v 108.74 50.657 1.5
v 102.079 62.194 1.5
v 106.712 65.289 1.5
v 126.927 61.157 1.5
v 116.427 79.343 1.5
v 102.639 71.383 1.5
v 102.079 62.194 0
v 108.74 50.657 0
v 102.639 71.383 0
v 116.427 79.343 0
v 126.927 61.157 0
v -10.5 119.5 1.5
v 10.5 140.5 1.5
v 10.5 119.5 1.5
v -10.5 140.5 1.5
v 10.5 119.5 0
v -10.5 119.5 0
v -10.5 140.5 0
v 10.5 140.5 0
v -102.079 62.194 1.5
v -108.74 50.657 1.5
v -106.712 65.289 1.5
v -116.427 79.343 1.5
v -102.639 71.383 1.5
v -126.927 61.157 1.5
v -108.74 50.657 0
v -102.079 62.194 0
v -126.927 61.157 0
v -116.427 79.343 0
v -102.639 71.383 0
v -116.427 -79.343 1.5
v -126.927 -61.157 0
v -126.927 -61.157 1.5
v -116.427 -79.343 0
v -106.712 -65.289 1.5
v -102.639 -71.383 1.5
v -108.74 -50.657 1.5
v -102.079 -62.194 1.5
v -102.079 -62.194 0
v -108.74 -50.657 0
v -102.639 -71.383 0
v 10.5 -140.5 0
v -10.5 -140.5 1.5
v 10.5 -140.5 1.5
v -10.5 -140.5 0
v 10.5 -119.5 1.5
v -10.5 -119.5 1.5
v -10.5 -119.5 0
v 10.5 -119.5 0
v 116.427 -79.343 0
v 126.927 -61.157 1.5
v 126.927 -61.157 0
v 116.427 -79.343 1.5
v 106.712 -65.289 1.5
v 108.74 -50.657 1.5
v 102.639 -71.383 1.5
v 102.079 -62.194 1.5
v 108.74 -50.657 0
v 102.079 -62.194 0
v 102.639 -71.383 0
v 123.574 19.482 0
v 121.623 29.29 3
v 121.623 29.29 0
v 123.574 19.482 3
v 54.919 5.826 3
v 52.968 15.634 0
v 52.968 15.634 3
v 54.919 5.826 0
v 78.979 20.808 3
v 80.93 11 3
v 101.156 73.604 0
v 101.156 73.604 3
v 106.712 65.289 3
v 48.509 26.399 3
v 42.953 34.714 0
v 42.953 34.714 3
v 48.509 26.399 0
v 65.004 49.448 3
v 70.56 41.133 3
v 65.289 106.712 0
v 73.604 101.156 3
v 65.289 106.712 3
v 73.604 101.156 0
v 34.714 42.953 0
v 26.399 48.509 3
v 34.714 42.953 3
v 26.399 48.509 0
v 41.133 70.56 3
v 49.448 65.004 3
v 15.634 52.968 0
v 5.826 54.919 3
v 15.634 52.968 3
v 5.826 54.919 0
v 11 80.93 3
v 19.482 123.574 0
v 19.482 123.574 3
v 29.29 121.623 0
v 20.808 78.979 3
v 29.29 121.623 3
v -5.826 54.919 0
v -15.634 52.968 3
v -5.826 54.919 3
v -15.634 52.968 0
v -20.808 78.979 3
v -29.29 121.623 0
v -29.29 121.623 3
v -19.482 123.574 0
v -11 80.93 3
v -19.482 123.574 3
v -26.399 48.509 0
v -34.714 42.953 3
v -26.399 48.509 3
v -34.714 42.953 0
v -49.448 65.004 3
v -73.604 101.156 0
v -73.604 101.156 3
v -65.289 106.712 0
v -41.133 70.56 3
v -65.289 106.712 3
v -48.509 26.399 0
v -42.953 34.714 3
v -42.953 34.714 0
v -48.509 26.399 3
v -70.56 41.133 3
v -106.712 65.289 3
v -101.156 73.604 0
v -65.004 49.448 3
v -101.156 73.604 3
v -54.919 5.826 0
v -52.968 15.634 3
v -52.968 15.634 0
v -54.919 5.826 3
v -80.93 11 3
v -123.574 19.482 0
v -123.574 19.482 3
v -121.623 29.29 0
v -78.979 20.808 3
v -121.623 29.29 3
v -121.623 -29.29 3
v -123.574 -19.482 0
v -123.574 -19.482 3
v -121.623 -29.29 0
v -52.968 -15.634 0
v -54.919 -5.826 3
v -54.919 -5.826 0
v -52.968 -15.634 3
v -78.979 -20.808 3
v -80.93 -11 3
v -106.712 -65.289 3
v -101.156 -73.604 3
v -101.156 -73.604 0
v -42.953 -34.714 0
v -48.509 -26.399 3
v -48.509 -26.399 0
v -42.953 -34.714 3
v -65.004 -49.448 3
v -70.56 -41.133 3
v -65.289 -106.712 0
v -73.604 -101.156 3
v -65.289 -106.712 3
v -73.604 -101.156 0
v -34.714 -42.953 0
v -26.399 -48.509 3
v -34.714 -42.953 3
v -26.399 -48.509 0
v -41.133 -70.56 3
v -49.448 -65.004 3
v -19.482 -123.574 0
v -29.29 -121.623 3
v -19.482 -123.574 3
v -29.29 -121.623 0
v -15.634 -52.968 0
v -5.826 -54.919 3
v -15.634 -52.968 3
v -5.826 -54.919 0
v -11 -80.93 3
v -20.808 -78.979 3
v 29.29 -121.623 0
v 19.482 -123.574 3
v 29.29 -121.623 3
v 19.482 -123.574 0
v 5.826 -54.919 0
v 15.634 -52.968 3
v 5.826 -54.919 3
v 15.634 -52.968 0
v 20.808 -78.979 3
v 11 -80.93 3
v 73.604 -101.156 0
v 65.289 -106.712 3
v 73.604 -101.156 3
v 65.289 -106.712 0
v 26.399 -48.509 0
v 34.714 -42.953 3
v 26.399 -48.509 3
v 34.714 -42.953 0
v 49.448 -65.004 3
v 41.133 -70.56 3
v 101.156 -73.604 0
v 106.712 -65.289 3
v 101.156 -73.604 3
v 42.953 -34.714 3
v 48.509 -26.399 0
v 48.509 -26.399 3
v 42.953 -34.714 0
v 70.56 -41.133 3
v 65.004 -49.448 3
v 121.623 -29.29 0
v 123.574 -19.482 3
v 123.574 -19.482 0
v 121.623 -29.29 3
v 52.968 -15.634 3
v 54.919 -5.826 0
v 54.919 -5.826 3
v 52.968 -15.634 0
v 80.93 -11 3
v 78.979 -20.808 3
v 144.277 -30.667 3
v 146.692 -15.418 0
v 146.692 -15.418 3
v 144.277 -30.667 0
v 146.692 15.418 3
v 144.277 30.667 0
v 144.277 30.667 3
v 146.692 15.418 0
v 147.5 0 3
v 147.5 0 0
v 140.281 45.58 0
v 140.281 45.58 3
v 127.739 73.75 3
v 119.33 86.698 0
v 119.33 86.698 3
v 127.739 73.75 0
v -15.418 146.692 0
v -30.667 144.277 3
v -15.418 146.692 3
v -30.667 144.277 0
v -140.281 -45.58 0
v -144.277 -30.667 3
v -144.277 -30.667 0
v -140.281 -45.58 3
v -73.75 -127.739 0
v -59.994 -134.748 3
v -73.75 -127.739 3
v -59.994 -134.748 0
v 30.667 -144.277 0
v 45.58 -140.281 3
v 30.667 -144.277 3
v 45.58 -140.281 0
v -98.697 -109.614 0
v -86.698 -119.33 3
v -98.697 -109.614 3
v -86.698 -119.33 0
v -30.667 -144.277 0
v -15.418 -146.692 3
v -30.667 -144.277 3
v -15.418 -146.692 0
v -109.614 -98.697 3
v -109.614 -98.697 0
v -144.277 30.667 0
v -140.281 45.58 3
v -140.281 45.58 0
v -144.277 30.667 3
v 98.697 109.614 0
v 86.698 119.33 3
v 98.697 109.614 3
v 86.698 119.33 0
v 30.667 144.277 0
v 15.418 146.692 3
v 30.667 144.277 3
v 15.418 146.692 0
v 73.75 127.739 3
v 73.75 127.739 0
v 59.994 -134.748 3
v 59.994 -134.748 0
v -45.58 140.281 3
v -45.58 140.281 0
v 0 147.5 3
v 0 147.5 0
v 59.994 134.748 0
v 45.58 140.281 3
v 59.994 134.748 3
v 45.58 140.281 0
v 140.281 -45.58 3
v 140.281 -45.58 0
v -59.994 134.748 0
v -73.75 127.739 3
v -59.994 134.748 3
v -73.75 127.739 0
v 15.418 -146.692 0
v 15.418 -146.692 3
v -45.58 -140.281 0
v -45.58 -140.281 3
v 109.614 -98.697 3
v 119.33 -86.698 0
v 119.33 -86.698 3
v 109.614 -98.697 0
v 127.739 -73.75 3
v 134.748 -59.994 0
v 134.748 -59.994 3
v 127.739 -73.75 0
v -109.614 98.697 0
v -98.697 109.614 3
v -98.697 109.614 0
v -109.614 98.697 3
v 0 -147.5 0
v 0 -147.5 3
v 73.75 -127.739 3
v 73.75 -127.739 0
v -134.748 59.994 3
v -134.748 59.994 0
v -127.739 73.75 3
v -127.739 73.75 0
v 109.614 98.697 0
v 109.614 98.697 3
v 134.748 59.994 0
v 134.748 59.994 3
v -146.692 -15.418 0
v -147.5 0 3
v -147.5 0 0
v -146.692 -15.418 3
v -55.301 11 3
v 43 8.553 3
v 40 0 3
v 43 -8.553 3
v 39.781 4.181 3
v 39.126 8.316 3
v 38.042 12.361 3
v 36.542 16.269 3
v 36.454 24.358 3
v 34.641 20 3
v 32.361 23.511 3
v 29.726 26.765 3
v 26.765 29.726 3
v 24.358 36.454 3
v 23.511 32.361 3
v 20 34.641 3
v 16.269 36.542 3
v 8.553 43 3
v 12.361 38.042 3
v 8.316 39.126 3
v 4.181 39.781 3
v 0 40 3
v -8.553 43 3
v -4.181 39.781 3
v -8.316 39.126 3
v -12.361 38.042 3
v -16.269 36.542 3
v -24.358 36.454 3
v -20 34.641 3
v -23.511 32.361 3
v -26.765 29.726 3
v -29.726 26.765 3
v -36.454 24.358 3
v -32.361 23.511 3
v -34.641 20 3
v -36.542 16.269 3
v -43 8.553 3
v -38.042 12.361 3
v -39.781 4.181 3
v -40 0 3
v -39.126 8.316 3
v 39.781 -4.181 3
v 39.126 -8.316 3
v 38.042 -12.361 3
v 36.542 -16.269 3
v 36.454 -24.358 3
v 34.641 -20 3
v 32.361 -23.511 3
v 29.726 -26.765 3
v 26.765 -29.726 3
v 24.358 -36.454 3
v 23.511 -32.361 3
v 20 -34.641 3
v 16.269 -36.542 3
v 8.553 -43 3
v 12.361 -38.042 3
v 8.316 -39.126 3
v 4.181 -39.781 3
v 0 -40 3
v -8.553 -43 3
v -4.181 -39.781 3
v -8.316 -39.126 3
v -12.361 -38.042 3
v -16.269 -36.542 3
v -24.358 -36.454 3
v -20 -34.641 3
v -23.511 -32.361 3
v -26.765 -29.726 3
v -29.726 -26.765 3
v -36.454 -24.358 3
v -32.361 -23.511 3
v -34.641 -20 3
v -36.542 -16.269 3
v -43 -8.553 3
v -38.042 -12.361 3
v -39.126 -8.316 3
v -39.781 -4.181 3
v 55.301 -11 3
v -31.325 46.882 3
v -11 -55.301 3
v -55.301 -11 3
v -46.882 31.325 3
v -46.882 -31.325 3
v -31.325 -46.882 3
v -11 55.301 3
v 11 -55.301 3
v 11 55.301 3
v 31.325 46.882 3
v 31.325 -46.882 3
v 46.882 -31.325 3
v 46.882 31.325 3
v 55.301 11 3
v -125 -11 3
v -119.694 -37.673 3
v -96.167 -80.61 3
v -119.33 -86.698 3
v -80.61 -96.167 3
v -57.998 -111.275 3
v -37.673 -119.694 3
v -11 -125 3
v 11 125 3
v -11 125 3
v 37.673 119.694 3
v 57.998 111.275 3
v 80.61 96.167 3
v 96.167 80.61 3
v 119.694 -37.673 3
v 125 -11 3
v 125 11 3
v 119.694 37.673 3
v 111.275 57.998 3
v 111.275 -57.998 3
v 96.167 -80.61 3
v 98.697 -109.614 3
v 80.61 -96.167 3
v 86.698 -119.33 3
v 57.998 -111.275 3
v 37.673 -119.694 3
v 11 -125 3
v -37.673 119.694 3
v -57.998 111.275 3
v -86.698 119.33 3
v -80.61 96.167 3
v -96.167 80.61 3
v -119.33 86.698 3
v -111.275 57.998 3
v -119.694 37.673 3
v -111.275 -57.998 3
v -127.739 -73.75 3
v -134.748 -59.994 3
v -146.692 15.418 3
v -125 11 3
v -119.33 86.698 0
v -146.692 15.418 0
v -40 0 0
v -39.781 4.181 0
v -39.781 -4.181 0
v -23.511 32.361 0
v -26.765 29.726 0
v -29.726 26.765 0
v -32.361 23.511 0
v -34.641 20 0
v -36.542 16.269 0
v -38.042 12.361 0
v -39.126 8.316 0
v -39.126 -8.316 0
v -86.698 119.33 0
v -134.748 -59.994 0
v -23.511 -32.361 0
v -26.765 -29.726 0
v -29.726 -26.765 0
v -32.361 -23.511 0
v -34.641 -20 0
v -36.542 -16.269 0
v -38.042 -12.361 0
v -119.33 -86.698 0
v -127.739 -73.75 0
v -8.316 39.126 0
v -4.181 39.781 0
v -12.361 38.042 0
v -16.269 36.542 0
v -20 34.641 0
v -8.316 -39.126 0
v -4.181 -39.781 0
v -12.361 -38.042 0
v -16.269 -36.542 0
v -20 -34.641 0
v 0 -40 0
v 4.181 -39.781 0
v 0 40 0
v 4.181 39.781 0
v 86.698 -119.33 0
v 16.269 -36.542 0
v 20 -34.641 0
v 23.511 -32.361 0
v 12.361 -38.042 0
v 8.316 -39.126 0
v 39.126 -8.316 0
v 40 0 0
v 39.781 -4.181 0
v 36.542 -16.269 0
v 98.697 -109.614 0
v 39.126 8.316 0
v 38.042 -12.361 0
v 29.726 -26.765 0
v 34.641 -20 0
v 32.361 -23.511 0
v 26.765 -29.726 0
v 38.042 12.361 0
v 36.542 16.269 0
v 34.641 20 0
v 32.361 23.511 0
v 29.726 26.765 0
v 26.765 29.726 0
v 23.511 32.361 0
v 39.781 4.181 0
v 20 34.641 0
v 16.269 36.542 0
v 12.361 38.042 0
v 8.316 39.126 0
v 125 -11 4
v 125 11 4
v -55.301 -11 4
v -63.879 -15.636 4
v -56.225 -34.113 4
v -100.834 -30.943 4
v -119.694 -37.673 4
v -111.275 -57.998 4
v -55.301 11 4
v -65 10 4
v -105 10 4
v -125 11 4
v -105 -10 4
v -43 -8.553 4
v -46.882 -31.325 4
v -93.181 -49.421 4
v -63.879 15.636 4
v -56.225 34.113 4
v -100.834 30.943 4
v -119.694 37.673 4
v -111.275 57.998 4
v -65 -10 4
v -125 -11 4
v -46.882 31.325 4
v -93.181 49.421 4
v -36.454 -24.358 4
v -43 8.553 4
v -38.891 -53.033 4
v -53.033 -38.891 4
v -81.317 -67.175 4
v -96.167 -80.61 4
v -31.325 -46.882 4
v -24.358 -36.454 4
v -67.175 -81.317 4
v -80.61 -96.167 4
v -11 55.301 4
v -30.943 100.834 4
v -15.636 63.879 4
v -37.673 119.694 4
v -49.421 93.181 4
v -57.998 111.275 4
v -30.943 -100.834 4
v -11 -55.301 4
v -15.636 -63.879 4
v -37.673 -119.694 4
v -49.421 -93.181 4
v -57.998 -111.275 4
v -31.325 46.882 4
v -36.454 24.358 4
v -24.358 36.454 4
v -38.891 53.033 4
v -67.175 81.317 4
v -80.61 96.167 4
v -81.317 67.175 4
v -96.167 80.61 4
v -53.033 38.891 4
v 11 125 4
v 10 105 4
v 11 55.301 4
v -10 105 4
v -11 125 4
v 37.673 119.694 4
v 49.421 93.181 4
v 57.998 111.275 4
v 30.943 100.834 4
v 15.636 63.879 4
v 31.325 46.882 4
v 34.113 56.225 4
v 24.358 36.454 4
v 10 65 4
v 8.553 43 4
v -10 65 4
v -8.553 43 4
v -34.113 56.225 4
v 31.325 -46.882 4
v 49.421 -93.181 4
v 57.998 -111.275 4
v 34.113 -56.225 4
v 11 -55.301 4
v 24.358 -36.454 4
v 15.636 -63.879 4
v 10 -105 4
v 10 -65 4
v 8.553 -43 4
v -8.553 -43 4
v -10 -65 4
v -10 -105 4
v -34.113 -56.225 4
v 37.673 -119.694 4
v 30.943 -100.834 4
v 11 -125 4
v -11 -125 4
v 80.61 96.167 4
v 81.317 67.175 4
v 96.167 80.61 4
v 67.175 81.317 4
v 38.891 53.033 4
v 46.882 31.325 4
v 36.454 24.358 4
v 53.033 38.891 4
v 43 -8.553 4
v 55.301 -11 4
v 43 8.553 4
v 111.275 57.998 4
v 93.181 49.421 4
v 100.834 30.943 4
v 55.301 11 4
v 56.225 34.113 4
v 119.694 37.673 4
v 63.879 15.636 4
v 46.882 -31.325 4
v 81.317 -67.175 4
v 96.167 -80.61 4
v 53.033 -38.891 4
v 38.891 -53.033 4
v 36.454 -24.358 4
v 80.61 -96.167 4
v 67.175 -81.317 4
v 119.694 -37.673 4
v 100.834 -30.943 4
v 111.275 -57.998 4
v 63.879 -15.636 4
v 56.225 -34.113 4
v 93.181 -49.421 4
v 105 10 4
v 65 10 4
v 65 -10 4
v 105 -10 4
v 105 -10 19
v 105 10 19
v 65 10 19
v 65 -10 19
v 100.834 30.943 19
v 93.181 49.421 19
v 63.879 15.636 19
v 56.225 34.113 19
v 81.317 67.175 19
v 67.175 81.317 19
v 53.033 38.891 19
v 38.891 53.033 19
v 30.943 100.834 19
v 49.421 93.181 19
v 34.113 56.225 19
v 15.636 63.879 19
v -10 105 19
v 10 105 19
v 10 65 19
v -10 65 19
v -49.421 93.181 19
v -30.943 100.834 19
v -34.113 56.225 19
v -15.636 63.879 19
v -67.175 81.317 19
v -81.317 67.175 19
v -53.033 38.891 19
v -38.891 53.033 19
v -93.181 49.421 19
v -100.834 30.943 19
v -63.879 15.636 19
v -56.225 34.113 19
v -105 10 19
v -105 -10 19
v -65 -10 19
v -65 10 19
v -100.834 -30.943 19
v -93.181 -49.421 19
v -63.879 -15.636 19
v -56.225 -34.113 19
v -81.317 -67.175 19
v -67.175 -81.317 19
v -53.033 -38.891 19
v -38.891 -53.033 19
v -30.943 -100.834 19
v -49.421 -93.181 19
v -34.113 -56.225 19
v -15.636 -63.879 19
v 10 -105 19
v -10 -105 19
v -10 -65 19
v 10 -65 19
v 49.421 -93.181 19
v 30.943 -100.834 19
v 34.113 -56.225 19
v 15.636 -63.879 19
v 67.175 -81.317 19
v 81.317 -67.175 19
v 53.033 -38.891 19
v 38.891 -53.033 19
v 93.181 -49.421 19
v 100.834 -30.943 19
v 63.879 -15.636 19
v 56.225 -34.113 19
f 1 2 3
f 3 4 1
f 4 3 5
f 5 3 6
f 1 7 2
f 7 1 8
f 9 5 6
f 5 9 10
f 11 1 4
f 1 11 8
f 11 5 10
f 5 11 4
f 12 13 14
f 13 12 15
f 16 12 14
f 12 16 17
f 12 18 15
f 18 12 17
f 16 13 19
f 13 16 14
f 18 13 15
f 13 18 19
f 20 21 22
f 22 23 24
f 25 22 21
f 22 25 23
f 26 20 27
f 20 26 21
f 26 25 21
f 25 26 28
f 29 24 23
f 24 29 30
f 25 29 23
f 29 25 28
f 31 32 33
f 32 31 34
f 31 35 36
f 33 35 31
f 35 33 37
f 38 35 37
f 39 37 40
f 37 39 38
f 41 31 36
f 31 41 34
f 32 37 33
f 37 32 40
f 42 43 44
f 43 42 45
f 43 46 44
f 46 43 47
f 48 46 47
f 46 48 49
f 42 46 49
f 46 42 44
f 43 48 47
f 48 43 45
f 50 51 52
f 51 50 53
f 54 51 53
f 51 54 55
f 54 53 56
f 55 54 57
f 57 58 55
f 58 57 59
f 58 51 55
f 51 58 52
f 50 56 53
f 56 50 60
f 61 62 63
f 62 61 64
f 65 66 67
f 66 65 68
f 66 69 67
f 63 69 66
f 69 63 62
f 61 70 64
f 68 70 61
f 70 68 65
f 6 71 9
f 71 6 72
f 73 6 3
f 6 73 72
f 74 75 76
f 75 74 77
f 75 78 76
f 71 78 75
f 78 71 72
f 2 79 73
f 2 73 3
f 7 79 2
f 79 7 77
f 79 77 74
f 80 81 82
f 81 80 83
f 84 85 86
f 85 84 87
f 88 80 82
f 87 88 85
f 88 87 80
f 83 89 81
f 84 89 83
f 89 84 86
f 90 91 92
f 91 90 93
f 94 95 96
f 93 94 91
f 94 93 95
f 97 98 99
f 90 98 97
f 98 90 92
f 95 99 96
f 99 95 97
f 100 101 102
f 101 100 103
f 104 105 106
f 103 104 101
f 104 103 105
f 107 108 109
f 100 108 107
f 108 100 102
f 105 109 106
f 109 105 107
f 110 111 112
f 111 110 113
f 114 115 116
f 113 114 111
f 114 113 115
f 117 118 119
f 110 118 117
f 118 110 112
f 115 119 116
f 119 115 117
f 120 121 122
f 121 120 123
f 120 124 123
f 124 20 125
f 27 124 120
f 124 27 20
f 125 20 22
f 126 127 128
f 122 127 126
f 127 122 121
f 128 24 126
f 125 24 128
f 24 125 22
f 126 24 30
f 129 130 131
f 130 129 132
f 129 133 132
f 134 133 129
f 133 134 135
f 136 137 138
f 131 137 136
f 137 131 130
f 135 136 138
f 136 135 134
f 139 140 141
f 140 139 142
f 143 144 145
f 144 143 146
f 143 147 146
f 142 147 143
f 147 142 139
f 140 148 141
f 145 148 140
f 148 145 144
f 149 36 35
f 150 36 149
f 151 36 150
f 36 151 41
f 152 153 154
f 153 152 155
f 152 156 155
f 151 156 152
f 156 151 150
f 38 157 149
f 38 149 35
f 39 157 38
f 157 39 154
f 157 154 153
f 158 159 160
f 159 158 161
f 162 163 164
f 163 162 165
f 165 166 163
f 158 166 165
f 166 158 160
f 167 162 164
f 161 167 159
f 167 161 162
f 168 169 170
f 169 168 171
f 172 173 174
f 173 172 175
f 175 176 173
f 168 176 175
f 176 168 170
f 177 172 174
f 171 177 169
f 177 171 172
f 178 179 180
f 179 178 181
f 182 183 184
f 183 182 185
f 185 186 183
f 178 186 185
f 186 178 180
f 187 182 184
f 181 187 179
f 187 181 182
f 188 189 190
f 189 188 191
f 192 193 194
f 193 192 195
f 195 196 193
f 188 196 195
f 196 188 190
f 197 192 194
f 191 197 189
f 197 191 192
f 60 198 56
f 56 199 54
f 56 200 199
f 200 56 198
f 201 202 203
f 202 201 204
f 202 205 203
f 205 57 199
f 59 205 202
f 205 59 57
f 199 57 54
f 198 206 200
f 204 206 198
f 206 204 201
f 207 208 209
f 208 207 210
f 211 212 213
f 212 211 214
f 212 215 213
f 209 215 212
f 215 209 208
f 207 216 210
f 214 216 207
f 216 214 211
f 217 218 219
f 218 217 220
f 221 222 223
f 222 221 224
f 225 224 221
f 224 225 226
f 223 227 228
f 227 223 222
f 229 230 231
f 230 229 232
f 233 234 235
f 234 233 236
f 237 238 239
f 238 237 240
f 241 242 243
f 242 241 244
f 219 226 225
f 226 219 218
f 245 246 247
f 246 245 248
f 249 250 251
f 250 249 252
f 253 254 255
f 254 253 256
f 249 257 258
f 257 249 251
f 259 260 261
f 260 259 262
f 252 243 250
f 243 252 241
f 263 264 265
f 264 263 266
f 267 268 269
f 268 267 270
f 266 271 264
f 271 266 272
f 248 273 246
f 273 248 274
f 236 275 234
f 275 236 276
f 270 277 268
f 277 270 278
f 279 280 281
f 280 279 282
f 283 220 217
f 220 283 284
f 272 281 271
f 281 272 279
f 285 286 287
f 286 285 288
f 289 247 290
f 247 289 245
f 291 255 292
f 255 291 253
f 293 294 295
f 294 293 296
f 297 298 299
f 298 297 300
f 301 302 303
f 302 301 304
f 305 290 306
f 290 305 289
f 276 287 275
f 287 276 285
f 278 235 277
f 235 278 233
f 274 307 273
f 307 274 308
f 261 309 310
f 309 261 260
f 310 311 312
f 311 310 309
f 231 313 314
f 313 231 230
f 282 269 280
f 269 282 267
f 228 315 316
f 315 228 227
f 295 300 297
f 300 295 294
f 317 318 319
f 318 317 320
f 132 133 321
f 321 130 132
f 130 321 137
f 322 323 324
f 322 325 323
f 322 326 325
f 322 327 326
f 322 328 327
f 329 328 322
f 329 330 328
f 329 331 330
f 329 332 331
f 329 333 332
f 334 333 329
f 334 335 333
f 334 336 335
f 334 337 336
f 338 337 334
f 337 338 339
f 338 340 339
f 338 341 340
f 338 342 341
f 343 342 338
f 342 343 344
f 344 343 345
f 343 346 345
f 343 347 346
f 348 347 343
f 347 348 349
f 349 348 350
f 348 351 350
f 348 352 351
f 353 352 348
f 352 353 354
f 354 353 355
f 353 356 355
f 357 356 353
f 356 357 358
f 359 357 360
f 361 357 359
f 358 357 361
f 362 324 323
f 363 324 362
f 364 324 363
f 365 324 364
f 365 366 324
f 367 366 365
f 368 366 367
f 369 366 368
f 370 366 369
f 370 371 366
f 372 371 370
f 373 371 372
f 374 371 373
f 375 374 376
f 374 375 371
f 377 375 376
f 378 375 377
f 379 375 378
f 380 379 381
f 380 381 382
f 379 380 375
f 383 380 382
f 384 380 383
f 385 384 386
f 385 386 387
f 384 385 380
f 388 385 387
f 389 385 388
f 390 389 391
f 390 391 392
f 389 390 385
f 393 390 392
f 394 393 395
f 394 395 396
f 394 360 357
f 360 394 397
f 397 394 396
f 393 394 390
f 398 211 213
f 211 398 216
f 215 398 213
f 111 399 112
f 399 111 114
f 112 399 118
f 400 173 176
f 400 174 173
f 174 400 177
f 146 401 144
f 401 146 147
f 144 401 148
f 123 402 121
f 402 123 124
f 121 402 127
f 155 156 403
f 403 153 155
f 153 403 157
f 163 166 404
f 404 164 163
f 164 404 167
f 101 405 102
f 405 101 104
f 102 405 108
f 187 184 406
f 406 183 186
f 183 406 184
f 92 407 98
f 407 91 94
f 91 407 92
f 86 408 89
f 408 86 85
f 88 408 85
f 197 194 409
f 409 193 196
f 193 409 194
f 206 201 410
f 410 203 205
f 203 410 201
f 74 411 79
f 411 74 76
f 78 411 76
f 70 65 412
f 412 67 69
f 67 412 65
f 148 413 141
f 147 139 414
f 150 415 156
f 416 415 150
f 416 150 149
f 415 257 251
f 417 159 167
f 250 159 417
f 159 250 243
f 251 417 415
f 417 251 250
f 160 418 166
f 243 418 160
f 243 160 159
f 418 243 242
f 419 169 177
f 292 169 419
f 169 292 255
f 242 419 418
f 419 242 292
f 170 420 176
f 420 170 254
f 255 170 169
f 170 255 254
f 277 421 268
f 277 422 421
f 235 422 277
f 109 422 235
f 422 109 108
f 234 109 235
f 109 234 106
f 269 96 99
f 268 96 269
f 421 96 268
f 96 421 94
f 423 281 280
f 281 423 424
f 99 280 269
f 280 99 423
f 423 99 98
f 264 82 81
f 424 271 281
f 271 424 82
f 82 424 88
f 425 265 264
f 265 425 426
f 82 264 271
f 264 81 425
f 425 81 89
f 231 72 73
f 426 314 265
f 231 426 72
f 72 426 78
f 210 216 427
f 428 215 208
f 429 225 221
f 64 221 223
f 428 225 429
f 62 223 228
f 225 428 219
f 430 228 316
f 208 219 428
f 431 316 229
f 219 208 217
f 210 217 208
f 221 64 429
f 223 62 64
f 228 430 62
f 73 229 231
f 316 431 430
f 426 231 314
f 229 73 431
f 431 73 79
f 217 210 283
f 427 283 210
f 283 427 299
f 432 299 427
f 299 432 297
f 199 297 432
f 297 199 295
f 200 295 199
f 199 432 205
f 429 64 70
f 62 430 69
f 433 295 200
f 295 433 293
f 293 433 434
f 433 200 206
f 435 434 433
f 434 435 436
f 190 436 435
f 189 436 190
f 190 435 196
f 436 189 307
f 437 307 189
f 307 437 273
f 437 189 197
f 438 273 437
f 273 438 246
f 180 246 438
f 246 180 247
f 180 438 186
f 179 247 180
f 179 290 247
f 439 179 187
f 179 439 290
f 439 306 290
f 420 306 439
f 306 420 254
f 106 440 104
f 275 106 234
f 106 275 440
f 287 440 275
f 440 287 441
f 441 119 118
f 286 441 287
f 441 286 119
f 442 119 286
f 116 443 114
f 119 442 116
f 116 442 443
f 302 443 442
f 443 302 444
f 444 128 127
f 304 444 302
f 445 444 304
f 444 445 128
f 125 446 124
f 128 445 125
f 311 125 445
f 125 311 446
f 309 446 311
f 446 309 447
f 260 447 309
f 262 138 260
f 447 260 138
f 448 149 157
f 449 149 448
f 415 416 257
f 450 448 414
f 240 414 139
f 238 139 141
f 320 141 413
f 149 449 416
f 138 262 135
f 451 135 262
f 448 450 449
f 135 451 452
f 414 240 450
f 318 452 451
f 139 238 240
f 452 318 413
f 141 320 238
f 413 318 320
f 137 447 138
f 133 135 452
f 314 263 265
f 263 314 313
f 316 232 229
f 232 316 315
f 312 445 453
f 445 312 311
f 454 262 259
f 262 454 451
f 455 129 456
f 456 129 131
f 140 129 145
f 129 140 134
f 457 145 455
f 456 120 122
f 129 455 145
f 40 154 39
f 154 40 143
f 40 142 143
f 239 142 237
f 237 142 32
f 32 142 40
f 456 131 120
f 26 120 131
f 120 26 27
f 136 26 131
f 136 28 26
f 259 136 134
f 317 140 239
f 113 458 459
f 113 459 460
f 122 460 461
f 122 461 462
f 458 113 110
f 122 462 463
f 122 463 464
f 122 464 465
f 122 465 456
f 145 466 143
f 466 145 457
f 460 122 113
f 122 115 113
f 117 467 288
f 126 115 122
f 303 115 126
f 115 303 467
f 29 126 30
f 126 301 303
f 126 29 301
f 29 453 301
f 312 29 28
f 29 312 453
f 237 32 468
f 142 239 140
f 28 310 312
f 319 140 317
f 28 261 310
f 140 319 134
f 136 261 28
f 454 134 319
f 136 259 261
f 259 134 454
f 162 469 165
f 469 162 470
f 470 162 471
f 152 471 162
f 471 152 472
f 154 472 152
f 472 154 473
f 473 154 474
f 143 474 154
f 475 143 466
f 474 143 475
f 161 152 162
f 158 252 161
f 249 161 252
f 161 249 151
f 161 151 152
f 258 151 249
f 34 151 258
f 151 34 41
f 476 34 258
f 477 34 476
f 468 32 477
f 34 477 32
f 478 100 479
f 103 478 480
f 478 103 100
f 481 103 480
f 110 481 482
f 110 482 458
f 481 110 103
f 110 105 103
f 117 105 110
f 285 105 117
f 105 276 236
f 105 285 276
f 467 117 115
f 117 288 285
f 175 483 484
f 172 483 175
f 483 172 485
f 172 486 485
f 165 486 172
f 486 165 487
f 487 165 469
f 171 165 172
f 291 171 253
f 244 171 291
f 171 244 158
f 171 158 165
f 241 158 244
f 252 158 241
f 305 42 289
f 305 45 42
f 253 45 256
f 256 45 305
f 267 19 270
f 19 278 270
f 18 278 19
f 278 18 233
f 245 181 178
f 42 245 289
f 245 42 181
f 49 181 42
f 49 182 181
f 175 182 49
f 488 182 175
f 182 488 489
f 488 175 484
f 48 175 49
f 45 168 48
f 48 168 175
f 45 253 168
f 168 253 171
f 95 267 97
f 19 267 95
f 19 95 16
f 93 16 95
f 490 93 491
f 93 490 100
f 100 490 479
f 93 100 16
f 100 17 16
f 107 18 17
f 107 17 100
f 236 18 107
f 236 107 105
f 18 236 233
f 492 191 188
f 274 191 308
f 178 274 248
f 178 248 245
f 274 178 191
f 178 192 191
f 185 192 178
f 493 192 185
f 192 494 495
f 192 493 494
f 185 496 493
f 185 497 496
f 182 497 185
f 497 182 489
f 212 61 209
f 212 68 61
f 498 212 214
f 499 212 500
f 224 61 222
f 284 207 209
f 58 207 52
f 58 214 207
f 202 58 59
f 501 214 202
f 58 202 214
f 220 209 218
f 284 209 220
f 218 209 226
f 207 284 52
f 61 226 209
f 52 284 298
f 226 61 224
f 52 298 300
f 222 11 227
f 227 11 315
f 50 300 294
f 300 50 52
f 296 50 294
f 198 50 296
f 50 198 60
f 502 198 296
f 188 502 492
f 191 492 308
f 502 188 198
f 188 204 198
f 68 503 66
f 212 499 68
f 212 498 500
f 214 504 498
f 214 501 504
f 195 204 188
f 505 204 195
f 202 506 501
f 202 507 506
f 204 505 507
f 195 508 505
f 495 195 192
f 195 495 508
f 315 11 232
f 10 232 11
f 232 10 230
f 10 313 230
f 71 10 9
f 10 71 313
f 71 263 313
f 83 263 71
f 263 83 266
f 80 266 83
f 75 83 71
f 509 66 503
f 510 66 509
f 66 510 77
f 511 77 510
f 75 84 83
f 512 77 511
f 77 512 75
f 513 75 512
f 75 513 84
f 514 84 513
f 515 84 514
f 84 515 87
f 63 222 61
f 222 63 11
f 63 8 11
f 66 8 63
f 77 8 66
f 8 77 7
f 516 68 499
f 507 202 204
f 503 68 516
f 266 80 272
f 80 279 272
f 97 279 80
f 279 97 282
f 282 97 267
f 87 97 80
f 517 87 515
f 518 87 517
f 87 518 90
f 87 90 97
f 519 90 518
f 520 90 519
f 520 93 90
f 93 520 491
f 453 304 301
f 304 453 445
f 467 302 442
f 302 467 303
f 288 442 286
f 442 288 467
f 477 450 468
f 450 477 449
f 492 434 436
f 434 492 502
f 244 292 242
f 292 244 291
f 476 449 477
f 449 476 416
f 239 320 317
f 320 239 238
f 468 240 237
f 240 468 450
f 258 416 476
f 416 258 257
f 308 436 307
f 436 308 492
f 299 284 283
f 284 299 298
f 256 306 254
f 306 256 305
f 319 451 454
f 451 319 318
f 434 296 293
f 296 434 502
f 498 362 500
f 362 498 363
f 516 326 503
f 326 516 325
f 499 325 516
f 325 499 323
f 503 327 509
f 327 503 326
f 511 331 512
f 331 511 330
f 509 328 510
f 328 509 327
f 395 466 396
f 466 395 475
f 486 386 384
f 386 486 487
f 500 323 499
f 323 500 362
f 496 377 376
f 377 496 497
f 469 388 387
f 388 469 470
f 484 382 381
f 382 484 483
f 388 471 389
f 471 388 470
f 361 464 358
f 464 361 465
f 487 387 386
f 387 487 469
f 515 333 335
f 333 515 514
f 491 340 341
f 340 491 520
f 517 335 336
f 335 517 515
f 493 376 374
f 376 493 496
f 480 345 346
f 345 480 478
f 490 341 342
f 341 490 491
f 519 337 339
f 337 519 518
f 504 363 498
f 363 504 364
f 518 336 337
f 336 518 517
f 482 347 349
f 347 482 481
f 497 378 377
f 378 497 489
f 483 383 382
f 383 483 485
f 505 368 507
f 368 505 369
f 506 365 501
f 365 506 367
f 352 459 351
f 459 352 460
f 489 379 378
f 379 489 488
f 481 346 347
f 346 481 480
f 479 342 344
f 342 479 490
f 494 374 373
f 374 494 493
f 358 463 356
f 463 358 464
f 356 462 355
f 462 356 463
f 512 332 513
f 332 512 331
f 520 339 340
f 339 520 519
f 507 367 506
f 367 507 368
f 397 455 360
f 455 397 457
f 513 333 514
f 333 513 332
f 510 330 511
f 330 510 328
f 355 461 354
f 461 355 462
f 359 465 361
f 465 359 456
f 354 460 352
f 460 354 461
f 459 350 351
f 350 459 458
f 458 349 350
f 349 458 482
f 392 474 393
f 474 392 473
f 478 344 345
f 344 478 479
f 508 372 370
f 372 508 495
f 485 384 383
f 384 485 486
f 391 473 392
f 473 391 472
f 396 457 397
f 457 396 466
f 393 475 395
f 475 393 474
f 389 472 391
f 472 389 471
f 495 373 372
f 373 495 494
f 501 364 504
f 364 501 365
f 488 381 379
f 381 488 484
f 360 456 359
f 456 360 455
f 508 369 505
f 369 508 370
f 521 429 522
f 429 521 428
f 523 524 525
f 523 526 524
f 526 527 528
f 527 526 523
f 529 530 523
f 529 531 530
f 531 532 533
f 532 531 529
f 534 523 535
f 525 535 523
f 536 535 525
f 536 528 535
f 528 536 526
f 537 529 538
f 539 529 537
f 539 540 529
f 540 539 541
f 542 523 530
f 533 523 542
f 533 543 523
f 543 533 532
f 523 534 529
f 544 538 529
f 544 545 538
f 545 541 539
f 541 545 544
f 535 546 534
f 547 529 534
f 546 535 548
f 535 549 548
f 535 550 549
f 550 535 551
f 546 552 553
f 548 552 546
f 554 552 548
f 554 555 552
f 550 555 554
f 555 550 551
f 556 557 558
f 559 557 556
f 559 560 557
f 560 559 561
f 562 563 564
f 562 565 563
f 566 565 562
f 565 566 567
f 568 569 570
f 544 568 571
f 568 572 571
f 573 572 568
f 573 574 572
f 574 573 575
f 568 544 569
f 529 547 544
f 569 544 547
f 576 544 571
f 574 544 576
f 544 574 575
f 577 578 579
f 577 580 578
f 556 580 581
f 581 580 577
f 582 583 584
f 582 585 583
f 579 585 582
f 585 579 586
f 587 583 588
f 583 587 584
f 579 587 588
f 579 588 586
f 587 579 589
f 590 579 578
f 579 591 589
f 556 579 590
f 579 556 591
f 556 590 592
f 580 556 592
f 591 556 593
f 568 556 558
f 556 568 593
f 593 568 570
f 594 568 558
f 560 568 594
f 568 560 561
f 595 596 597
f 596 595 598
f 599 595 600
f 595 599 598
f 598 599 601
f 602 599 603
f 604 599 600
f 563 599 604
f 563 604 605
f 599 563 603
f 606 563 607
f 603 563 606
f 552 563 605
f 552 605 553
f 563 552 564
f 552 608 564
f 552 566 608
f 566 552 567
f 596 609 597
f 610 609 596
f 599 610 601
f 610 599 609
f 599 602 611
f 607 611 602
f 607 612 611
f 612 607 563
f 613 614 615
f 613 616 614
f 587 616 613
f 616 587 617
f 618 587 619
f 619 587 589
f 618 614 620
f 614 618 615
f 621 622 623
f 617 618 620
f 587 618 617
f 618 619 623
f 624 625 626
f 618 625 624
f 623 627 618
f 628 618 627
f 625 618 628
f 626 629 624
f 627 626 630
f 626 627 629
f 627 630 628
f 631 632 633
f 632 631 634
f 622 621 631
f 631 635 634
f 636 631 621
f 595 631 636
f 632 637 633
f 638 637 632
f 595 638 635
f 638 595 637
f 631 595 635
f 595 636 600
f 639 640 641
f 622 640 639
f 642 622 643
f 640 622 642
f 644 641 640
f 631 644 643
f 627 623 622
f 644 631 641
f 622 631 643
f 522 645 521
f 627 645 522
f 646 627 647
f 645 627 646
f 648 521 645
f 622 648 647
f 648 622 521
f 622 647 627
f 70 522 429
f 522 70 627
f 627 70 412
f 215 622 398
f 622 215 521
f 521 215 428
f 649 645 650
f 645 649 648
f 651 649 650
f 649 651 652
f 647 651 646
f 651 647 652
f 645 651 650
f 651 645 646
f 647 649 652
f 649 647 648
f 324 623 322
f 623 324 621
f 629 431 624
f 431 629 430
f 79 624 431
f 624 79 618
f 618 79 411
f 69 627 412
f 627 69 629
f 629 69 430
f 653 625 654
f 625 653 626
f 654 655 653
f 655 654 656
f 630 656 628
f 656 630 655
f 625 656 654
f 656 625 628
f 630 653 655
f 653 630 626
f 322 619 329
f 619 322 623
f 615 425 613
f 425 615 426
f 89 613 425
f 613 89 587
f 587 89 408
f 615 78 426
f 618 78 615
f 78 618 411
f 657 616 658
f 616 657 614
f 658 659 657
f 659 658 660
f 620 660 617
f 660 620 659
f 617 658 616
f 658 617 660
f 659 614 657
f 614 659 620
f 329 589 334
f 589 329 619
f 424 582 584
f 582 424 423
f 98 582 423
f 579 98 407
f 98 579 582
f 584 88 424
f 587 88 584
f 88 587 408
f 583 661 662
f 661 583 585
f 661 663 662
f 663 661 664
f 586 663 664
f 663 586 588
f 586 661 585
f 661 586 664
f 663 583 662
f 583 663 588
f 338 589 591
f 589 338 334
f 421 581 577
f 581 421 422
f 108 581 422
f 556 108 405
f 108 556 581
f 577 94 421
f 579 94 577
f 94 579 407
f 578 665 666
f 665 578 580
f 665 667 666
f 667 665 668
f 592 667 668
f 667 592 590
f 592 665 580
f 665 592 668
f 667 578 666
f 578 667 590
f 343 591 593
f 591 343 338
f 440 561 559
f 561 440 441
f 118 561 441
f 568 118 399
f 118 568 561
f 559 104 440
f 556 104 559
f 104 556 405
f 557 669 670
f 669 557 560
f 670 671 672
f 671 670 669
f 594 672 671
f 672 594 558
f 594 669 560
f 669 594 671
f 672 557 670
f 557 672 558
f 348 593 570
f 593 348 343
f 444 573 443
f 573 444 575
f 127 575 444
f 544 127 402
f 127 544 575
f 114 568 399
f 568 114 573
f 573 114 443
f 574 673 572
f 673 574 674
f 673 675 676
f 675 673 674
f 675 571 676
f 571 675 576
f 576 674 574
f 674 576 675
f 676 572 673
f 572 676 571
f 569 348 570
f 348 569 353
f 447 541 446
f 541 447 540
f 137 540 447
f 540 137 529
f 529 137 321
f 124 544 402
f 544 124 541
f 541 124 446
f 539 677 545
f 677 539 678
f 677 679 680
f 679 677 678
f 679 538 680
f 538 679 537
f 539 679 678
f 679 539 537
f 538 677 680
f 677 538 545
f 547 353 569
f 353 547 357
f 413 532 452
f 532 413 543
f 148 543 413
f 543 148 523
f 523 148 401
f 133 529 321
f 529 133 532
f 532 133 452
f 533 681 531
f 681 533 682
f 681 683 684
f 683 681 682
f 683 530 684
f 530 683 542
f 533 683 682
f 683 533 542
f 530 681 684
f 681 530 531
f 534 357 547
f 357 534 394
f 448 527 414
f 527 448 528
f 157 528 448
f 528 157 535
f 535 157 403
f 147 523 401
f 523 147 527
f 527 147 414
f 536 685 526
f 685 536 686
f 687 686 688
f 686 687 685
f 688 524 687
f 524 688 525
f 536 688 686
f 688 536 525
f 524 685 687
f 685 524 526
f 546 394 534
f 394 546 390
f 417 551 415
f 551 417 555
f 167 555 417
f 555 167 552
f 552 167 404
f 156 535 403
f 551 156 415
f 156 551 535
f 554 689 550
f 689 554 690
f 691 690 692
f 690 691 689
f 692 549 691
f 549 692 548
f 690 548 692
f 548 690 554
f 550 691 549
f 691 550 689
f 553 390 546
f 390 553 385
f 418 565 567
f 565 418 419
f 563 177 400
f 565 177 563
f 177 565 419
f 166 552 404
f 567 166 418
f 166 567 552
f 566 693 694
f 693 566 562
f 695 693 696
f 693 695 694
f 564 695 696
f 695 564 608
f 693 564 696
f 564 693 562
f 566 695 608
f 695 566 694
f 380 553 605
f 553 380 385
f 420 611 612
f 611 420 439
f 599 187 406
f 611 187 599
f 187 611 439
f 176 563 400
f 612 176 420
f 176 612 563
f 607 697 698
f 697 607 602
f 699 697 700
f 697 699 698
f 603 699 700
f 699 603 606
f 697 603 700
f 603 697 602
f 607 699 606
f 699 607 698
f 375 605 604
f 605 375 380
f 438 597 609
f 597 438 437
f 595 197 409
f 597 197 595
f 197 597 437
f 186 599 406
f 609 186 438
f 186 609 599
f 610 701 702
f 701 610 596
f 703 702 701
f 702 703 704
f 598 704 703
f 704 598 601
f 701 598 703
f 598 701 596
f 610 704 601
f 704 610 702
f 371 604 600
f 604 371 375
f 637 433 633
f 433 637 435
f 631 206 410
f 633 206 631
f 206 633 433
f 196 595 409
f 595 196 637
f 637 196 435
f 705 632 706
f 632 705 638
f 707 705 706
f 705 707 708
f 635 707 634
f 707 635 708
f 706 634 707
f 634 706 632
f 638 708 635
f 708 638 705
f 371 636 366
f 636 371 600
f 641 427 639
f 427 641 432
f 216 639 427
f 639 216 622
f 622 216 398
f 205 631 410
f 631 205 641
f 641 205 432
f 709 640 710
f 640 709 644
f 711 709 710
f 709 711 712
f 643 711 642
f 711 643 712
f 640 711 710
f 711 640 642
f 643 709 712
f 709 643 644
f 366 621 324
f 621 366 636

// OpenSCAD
// file: parameters.scad
// Coral-Reef Column TPU Tower - Parameters
// Based on designs/column-tpu-tower/DESIGN.md

// Global Resolution
$fn = 60; // Medium resolution for preview

// Overall Dimensions
tower_diameter = 300;
tower_radius = tower_diameter / 2;
inner_core_diameter = 80;
inner_core_radius = inner_core_diameter / 2;

// Vertical Dimensions
base_height = 60;
top_height = 80;
layer_spacing = 80; // Center-to-center vertical distance
tray_thickness = 3;
num_layers = 6;

// Calculated Total Height
// Base + (Layers * Spacing) + Top?
// No, Base + Layers Stack + Top
// Let's assume the layers stack on the rails.
total_height = base_height + (num_layers * layer_spacing) + top_height;

// Structural Rails
rail_count = 6;
rail_width = 20; // 2020 extrusion
rail_depth = 20;
rail_offset = tower_radius - 20; // Inset from edge

// Tray Details
tray_diameter = tower_diameter - 5; // Slight clearance
m2_slot_count = 16;
m2_width = 22;
m2_length = 80;

// Colors
color_aluminum = [0.9, 0.9, 0.9];
color_pcb = [0.2, 0.5, 0.2];
color_black = [0.2, 0.2, 0.2];
// main file
include <parameters.scad>;

module m2_module() {
    // Standard M.2 2280 module representation

    // PCB
    color(color_pcb)
    cube([m2_length, m2_width, 1]);

    // Heatsink (as per design specs: 40x20x15mm minimum)
    // Centered on the module roughly
    translate([20, 1, 1]) // Small offset
    color(color_black)
    cube([40, 20, 15]);

    // Connector Gold Fingers area (visual)
    color("gold")
    translate([-2, 1, 0])
    cube([2, 20, 1]);
}

module tray() {
    union() {
        difference() {
            // Base plate
            color(color_aluminum)
            cylinder(h=tray_thickness, r=tray_diameter/2);

            // Central Air Hole
            translate([0,0,-1])
            cylinder(h=tray_thickness+2, r=inner_core_radius);

            // Rail Cutouts/Mounting points
            // Assuming rails pass through or mount to edge
            for(i=[0:rail_count-1]) {
                rotate([0, 0, i * (360/rail_count) + 30]) // Offset from M.2s
                translate([rail_offset, 0, -1])
                // Square cutout for rail pass-through
                cube([rail_depth+1, rail_width+1, tray_thickness+2], center=true);
            }

            // Ventilation Slots (between M.2s)
            for(i=[0:m2_slot_count-1]) {
                rotate([0, 0, i * (360/m2_slot_count) + (360/m2_slot_count)/2])
                translate([inner_core_radius + 15, -5, -1])
                cube([m2_length-10, 10, tray_thickness+2]);
            }
        }

        // Populate with M.2 Modules
        for(i=[0:m2_slot_count-1]) {
            rotate([0, 0, i * (360/m2_slot_count)])
            translate([inner_core_radius + 5, -m2_width/2, tray_thickness])
            m2_module();
        }
    }
}

tray();
